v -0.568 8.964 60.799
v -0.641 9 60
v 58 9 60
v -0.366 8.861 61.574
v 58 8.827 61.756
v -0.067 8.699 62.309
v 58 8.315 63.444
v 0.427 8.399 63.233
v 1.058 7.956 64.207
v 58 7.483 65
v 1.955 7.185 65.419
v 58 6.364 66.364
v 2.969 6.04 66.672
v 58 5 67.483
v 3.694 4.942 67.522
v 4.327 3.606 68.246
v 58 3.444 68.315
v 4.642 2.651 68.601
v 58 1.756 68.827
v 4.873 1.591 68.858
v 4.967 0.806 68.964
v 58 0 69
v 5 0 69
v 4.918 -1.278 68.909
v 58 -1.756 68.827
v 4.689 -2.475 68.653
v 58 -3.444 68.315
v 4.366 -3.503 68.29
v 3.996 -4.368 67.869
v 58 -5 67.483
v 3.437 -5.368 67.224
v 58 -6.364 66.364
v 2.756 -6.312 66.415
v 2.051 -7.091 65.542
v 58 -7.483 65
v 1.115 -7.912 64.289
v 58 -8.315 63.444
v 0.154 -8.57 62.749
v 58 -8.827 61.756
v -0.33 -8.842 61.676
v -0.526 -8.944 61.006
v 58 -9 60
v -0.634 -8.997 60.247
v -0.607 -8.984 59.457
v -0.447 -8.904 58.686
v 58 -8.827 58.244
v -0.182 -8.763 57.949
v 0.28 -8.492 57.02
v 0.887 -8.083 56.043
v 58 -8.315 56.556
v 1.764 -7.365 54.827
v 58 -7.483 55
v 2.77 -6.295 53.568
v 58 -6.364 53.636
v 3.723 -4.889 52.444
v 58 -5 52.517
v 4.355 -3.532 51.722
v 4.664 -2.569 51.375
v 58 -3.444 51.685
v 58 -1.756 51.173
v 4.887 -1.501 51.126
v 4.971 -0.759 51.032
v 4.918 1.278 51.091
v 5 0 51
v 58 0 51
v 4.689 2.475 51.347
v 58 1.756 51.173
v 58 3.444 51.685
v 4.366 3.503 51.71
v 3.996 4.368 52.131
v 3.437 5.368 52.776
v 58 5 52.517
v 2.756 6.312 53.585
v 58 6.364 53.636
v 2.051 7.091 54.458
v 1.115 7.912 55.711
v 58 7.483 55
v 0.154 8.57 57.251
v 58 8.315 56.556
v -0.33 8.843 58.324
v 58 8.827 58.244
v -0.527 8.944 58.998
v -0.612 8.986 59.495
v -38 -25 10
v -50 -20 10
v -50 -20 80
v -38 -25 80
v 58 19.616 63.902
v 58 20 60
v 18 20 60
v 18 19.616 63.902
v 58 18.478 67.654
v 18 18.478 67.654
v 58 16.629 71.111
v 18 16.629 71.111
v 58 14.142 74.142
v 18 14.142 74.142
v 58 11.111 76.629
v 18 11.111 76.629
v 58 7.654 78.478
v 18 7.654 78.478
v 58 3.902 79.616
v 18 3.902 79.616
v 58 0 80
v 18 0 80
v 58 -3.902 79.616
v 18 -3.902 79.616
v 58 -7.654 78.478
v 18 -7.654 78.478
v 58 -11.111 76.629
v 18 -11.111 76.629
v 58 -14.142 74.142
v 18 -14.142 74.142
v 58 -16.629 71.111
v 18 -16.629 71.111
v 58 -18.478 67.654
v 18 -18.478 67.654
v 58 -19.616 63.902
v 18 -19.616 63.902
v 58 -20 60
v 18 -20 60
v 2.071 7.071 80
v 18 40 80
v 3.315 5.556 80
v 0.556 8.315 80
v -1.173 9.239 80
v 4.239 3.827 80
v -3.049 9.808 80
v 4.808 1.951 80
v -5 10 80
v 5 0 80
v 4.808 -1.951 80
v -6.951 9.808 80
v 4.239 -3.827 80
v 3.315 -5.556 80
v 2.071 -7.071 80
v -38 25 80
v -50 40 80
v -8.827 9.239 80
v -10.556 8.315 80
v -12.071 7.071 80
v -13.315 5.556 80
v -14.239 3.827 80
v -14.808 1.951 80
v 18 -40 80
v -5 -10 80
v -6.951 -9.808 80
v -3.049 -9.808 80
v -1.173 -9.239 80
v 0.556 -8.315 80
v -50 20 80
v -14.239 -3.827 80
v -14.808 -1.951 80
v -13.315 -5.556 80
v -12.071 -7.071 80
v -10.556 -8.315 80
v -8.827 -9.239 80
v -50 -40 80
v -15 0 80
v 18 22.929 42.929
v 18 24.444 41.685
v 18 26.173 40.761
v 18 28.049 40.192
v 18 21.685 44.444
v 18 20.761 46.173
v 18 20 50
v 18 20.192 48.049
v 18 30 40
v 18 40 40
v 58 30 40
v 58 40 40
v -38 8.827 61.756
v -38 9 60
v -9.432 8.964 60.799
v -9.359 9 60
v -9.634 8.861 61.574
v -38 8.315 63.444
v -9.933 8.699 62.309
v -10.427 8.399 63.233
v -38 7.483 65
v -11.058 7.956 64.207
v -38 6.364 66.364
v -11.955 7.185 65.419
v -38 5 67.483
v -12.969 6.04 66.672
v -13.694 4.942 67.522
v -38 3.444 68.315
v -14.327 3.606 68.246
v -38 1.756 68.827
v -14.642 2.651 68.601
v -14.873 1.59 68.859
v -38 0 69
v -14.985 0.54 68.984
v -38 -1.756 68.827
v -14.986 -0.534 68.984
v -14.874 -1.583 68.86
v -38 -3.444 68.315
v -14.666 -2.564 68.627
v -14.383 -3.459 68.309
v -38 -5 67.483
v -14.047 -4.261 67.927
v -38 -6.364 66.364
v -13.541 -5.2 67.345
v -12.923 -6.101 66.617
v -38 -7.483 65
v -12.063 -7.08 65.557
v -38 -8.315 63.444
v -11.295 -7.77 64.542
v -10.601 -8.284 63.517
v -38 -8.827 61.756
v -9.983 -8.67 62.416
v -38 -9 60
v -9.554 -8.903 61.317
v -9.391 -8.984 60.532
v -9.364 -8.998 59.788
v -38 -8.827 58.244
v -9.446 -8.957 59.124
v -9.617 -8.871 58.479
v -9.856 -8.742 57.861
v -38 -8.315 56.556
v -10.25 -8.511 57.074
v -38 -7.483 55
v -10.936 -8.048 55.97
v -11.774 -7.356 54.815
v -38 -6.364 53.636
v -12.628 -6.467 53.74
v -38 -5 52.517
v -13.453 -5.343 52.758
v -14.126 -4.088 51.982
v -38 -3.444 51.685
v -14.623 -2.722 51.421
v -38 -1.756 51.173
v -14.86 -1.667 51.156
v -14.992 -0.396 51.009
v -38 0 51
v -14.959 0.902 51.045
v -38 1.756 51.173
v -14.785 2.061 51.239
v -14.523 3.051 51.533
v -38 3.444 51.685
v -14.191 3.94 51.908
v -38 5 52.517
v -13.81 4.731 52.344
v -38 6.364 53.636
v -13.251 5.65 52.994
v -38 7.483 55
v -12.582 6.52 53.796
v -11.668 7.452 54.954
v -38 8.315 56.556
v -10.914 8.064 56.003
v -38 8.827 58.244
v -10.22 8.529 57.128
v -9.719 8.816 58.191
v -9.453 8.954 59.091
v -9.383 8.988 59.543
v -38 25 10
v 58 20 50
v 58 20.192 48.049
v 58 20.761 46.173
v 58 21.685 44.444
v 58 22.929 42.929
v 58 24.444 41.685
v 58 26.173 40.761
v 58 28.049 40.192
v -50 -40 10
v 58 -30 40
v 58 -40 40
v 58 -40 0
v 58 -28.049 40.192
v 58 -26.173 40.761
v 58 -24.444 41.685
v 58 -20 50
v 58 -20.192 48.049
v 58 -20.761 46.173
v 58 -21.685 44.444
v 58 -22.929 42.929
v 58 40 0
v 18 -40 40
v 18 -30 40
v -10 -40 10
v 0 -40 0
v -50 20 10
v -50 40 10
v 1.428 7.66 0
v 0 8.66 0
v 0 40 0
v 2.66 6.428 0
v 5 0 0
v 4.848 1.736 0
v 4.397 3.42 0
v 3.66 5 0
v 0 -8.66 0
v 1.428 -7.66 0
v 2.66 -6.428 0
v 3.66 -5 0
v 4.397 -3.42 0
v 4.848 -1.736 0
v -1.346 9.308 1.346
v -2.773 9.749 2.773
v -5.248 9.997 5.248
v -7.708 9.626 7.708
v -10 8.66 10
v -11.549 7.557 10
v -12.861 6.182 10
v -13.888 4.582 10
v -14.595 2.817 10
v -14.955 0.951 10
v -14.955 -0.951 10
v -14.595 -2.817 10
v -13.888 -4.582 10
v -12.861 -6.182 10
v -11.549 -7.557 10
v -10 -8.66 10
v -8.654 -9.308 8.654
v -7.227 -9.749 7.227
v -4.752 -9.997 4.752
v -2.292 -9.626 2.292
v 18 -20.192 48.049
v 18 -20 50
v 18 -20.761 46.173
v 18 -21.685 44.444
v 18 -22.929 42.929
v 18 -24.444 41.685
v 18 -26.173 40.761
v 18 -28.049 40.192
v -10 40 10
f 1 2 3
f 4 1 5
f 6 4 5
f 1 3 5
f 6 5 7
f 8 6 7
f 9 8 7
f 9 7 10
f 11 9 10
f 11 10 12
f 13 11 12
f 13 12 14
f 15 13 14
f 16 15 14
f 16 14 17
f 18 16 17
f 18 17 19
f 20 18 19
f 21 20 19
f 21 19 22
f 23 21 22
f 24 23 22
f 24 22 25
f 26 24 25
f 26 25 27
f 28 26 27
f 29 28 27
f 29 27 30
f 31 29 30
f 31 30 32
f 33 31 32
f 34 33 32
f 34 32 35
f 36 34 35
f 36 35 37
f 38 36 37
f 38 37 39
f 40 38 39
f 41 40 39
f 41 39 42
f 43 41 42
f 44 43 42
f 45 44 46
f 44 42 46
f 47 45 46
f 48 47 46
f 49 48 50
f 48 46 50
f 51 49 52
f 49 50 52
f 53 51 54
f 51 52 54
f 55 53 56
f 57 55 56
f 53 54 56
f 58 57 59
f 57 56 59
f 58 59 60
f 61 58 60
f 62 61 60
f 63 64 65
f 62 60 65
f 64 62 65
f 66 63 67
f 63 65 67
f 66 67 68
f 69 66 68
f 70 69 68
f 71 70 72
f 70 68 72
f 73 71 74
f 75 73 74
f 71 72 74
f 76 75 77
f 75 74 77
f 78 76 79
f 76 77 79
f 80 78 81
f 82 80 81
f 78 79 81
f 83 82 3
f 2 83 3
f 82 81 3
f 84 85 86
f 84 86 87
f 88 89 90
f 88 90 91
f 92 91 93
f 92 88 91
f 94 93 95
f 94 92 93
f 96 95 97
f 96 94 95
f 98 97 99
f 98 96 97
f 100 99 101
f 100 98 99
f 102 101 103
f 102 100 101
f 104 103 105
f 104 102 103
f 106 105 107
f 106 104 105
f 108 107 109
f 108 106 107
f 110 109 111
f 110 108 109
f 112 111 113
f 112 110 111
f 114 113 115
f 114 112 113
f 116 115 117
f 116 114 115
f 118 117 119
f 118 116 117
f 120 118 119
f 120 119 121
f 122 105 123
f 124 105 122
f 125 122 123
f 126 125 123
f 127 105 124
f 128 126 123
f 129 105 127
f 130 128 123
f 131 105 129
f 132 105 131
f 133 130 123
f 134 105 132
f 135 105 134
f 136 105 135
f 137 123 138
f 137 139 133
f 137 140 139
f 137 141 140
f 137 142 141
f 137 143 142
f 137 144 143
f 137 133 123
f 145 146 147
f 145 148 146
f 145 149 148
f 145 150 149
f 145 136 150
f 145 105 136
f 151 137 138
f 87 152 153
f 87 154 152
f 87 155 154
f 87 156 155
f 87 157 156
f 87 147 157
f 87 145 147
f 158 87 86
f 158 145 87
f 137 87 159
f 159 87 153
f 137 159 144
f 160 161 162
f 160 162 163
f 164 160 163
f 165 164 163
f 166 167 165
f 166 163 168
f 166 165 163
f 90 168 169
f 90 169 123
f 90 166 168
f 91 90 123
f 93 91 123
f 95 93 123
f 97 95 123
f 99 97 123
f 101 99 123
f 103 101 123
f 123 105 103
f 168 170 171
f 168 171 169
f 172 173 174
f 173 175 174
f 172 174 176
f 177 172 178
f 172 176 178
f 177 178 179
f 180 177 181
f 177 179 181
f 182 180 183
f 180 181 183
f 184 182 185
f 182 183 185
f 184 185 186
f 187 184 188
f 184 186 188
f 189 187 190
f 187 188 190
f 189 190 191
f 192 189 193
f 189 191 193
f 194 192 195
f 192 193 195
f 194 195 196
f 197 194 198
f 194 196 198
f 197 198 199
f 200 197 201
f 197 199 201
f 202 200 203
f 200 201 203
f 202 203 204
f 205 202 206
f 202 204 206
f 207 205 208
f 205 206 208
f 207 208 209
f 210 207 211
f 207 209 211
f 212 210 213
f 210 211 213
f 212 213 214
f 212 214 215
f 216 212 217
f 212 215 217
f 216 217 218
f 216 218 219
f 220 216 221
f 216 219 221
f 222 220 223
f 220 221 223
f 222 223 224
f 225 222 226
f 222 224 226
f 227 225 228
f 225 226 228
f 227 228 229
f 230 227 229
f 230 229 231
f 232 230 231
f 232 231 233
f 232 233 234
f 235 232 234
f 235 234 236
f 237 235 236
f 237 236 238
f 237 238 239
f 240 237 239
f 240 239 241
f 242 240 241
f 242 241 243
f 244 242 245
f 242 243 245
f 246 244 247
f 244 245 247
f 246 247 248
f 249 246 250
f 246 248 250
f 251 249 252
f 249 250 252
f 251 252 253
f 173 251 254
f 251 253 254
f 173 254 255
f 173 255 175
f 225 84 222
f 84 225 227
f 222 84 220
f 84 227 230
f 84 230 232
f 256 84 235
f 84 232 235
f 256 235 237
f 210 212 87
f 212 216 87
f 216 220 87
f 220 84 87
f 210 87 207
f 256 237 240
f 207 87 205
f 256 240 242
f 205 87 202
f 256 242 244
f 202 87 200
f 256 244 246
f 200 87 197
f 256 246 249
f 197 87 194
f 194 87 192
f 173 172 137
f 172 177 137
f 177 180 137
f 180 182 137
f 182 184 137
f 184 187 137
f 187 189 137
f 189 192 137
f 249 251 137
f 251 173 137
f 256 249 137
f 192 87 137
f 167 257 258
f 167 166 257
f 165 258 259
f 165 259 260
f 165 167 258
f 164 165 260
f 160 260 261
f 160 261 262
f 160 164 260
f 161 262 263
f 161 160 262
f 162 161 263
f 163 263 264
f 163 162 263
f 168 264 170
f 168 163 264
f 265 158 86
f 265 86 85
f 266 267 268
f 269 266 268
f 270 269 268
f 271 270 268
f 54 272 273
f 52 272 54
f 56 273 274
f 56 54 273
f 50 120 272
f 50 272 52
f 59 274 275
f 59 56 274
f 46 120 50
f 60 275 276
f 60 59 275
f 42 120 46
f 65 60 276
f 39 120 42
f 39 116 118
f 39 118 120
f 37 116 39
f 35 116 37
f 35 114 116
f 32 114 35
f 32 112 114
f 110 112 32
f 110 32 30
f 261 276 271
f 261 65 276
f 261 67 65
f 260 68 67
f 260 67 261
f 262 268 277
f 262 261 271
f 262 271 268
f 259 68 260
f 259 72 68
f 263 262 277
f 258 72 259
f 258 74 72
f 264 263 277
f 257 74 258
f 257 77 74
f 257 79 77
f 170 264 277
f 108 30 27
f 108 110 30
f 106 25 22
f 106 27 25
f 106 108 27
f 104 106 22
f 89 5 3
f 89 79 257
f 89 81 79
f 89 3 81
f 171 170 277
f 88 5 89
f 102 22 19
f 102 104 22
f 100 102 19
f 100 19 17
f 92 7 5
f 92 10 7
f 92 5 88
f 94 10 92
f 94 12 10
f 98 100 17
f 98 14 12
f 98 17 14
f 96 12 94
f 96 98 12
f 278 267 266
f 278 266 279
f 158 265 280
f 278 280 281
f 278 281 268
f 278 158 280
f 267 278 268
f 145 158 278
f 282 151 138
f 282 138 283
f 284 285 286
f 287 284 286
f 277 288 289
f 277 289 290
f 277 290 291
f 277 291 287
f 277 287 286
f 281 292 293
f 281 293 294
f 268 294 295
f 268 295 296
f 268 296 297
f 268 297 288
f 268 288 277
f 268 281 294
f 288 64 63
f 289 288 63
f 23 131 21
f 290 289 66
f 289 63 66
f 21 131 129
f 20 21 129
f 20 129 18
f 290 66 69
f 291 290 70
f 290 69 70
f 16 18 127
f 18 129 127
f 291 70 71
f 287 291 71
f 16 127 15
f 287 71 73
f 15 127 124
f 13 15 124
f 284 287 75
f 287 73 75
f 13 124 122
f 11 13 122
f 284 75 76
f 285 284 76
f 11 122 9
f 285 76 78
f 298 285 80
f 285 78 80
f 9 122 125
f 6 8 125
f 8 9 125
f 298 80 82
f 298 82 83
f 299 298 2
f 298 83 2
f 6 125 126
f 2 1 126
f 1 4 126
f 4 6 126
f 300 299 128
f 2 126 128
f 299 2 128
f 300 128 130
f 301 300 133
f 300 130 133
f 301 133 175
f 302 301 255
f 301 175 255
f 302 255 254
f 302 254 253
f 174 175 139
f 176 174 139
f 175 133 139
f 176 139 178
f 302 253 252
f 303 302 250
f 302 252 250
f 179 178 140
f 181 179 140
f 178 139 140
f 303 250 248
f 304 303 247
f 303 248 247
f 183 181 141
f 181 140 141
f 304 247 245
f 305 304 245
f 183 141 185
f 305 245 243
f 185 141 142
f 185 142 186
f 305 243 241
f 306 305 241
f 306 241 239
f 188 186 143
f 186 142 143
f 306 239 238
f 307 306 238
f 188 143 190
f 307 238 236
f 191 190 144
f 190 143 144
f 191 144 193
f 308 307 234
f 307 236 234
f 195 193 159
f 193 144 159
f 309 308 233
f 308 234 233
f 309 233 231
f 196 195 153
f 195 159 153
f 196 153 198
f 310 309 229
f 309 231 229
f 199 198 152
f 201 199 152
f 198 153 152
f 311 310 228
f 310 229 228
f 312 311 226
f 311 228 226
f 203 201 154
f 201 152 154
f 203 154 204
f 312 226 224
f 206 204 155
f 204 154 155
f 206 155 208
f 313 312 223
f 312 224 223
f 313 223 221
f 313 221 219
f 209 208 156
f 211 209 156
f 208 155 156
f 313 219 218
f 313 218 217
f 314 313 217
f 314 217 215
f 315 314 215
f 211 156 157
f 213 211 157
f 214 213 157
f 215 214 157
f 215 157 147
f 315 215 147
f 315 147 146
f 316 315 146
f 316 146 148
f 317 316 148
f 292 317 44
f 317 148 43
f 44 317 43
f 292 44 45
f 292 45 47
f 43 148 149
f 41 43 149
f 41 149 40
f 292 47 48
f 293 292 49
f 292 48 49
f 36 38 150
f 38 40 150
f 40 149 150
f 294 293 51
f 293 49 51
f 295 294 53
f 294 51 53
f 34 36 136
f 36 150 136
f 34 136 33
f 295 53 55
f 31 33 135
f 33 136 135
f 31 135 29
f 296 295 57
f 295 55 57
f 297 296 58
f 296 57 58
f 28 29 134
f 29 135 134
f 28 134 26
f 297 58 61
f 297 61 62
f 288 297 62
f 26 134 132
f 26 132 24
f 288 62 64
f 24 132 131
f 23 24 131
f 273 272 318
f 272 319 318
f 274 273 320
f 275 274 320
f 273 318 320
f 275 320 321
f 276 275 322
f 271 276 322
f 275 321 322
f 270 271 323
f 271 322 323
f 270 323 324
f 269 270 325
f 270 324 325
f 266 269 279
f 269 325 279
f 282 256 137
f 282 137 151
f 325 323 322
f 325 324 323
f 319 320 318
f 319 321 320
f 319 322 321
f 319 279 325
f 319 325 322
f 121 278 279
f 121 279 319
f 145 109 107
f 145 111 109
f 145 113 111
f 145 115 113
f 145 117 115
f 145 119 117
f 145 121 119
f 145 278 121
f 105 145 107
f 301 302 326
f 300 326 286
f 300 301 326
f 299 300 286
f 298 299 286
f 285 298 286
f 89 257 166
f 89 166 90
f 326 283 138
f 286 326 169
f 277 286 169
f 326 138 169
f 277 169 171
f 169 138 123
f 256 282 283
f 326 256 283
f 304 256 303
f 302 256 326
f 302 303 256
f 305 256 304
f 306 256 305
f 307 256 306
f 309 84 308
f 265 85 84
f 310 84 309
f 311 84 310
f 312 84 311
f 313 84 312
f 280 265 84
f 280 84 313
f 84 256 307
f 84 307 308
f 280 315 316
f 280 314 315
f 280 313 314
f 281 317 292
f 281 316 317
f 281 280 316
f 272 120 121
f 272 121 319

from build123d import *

# Parameters (mm, degrees)
F1_DEPTH = 40
F2_R     = 9
F3_DEPTH = 40
F4_R     = 9
F5_DEPTH = 132.5
F7_DEPTH = 100
F6_R     = 10
F9_R     = 10


with BuildPart() as f1:
    # F0 (on Front) → F1 (new body, symmetric)
    with BuildSketch(Plane.XZ):
        Polygon((-10, 10), (0, 0), (58, 0), (58, 40), (18, 40), (18, 80), (-50, 80), (-50, 10), align=None)
    extrude(amount=F1_DEPTH, both=True)

    # F2 (on face) → F3 (join)
    with BuildSketch(Plane.YZ.offset(58)):
        with BuildLine():
            Line((20, 40), (20, 60))
            ThreePointArc((20, 60), (0, 80), (-20, 60))
            Line((-20, 60), (-20, 40))
            Line((-20, 40), (-40, 40))
            Line((-40, 40), (-40, 0))
            Line((-40, 0), (40, 0))
            Line((40, 0), (40, 40))
            Line((40, 40), (20, 40))
        make_face()
        with Locations((0, 60)):
            Circle(F2_R, mode=Mode.SUBTRACT)
    extrude(amount=-F3_DEPTH)


with BuildPart() as f5:
    # F4 (on face) → F5 (new body)
    with BuildSketch(Plane.YZ.offset(18)):
        with Locations((0, 60)):
            Circle(F4_R)
    extrude(amount=-F5_DEPTH)


with BuildPart() as f7:
    # F6 (on face) → F7 (new body)
    with BuildSketch(Plane.XY.offset(80)):
        Polygon((-50, 20), (-50, 0), (-50, -20), (-38, -25), (-38, 25), align=None)
    extrude(amount=-F7_DEPTH)


with BuildPart() as f7b:
    # F6 (on face) → F7, piece 2 (new body)
    with BuildSketch(Plane.XY.offset(80)):
        with Locations((-5, 0)):
            Circle(F6_R)
    extrude(amount=-F7_DEPTH)


with BuildPart() as f1_1:
    add(f1.part)

    # F8: cut F5, F7, F7b
    add(f5.part, mode=Mode.SUBTRACT)
    add(f7.part, mode=Mode.SUBTRACT)
    add(f7b.part, mode=Mode.SUBTRACT)

    # F9
    f9_edges = [f1_1.edges().sort_by_distance(p)[0] for p in [
        (38, -20, 40),
        (38, 20, 40),
    ]]
    fillet(f9_edges, radius=F9_R)


solid = f1_1.part
